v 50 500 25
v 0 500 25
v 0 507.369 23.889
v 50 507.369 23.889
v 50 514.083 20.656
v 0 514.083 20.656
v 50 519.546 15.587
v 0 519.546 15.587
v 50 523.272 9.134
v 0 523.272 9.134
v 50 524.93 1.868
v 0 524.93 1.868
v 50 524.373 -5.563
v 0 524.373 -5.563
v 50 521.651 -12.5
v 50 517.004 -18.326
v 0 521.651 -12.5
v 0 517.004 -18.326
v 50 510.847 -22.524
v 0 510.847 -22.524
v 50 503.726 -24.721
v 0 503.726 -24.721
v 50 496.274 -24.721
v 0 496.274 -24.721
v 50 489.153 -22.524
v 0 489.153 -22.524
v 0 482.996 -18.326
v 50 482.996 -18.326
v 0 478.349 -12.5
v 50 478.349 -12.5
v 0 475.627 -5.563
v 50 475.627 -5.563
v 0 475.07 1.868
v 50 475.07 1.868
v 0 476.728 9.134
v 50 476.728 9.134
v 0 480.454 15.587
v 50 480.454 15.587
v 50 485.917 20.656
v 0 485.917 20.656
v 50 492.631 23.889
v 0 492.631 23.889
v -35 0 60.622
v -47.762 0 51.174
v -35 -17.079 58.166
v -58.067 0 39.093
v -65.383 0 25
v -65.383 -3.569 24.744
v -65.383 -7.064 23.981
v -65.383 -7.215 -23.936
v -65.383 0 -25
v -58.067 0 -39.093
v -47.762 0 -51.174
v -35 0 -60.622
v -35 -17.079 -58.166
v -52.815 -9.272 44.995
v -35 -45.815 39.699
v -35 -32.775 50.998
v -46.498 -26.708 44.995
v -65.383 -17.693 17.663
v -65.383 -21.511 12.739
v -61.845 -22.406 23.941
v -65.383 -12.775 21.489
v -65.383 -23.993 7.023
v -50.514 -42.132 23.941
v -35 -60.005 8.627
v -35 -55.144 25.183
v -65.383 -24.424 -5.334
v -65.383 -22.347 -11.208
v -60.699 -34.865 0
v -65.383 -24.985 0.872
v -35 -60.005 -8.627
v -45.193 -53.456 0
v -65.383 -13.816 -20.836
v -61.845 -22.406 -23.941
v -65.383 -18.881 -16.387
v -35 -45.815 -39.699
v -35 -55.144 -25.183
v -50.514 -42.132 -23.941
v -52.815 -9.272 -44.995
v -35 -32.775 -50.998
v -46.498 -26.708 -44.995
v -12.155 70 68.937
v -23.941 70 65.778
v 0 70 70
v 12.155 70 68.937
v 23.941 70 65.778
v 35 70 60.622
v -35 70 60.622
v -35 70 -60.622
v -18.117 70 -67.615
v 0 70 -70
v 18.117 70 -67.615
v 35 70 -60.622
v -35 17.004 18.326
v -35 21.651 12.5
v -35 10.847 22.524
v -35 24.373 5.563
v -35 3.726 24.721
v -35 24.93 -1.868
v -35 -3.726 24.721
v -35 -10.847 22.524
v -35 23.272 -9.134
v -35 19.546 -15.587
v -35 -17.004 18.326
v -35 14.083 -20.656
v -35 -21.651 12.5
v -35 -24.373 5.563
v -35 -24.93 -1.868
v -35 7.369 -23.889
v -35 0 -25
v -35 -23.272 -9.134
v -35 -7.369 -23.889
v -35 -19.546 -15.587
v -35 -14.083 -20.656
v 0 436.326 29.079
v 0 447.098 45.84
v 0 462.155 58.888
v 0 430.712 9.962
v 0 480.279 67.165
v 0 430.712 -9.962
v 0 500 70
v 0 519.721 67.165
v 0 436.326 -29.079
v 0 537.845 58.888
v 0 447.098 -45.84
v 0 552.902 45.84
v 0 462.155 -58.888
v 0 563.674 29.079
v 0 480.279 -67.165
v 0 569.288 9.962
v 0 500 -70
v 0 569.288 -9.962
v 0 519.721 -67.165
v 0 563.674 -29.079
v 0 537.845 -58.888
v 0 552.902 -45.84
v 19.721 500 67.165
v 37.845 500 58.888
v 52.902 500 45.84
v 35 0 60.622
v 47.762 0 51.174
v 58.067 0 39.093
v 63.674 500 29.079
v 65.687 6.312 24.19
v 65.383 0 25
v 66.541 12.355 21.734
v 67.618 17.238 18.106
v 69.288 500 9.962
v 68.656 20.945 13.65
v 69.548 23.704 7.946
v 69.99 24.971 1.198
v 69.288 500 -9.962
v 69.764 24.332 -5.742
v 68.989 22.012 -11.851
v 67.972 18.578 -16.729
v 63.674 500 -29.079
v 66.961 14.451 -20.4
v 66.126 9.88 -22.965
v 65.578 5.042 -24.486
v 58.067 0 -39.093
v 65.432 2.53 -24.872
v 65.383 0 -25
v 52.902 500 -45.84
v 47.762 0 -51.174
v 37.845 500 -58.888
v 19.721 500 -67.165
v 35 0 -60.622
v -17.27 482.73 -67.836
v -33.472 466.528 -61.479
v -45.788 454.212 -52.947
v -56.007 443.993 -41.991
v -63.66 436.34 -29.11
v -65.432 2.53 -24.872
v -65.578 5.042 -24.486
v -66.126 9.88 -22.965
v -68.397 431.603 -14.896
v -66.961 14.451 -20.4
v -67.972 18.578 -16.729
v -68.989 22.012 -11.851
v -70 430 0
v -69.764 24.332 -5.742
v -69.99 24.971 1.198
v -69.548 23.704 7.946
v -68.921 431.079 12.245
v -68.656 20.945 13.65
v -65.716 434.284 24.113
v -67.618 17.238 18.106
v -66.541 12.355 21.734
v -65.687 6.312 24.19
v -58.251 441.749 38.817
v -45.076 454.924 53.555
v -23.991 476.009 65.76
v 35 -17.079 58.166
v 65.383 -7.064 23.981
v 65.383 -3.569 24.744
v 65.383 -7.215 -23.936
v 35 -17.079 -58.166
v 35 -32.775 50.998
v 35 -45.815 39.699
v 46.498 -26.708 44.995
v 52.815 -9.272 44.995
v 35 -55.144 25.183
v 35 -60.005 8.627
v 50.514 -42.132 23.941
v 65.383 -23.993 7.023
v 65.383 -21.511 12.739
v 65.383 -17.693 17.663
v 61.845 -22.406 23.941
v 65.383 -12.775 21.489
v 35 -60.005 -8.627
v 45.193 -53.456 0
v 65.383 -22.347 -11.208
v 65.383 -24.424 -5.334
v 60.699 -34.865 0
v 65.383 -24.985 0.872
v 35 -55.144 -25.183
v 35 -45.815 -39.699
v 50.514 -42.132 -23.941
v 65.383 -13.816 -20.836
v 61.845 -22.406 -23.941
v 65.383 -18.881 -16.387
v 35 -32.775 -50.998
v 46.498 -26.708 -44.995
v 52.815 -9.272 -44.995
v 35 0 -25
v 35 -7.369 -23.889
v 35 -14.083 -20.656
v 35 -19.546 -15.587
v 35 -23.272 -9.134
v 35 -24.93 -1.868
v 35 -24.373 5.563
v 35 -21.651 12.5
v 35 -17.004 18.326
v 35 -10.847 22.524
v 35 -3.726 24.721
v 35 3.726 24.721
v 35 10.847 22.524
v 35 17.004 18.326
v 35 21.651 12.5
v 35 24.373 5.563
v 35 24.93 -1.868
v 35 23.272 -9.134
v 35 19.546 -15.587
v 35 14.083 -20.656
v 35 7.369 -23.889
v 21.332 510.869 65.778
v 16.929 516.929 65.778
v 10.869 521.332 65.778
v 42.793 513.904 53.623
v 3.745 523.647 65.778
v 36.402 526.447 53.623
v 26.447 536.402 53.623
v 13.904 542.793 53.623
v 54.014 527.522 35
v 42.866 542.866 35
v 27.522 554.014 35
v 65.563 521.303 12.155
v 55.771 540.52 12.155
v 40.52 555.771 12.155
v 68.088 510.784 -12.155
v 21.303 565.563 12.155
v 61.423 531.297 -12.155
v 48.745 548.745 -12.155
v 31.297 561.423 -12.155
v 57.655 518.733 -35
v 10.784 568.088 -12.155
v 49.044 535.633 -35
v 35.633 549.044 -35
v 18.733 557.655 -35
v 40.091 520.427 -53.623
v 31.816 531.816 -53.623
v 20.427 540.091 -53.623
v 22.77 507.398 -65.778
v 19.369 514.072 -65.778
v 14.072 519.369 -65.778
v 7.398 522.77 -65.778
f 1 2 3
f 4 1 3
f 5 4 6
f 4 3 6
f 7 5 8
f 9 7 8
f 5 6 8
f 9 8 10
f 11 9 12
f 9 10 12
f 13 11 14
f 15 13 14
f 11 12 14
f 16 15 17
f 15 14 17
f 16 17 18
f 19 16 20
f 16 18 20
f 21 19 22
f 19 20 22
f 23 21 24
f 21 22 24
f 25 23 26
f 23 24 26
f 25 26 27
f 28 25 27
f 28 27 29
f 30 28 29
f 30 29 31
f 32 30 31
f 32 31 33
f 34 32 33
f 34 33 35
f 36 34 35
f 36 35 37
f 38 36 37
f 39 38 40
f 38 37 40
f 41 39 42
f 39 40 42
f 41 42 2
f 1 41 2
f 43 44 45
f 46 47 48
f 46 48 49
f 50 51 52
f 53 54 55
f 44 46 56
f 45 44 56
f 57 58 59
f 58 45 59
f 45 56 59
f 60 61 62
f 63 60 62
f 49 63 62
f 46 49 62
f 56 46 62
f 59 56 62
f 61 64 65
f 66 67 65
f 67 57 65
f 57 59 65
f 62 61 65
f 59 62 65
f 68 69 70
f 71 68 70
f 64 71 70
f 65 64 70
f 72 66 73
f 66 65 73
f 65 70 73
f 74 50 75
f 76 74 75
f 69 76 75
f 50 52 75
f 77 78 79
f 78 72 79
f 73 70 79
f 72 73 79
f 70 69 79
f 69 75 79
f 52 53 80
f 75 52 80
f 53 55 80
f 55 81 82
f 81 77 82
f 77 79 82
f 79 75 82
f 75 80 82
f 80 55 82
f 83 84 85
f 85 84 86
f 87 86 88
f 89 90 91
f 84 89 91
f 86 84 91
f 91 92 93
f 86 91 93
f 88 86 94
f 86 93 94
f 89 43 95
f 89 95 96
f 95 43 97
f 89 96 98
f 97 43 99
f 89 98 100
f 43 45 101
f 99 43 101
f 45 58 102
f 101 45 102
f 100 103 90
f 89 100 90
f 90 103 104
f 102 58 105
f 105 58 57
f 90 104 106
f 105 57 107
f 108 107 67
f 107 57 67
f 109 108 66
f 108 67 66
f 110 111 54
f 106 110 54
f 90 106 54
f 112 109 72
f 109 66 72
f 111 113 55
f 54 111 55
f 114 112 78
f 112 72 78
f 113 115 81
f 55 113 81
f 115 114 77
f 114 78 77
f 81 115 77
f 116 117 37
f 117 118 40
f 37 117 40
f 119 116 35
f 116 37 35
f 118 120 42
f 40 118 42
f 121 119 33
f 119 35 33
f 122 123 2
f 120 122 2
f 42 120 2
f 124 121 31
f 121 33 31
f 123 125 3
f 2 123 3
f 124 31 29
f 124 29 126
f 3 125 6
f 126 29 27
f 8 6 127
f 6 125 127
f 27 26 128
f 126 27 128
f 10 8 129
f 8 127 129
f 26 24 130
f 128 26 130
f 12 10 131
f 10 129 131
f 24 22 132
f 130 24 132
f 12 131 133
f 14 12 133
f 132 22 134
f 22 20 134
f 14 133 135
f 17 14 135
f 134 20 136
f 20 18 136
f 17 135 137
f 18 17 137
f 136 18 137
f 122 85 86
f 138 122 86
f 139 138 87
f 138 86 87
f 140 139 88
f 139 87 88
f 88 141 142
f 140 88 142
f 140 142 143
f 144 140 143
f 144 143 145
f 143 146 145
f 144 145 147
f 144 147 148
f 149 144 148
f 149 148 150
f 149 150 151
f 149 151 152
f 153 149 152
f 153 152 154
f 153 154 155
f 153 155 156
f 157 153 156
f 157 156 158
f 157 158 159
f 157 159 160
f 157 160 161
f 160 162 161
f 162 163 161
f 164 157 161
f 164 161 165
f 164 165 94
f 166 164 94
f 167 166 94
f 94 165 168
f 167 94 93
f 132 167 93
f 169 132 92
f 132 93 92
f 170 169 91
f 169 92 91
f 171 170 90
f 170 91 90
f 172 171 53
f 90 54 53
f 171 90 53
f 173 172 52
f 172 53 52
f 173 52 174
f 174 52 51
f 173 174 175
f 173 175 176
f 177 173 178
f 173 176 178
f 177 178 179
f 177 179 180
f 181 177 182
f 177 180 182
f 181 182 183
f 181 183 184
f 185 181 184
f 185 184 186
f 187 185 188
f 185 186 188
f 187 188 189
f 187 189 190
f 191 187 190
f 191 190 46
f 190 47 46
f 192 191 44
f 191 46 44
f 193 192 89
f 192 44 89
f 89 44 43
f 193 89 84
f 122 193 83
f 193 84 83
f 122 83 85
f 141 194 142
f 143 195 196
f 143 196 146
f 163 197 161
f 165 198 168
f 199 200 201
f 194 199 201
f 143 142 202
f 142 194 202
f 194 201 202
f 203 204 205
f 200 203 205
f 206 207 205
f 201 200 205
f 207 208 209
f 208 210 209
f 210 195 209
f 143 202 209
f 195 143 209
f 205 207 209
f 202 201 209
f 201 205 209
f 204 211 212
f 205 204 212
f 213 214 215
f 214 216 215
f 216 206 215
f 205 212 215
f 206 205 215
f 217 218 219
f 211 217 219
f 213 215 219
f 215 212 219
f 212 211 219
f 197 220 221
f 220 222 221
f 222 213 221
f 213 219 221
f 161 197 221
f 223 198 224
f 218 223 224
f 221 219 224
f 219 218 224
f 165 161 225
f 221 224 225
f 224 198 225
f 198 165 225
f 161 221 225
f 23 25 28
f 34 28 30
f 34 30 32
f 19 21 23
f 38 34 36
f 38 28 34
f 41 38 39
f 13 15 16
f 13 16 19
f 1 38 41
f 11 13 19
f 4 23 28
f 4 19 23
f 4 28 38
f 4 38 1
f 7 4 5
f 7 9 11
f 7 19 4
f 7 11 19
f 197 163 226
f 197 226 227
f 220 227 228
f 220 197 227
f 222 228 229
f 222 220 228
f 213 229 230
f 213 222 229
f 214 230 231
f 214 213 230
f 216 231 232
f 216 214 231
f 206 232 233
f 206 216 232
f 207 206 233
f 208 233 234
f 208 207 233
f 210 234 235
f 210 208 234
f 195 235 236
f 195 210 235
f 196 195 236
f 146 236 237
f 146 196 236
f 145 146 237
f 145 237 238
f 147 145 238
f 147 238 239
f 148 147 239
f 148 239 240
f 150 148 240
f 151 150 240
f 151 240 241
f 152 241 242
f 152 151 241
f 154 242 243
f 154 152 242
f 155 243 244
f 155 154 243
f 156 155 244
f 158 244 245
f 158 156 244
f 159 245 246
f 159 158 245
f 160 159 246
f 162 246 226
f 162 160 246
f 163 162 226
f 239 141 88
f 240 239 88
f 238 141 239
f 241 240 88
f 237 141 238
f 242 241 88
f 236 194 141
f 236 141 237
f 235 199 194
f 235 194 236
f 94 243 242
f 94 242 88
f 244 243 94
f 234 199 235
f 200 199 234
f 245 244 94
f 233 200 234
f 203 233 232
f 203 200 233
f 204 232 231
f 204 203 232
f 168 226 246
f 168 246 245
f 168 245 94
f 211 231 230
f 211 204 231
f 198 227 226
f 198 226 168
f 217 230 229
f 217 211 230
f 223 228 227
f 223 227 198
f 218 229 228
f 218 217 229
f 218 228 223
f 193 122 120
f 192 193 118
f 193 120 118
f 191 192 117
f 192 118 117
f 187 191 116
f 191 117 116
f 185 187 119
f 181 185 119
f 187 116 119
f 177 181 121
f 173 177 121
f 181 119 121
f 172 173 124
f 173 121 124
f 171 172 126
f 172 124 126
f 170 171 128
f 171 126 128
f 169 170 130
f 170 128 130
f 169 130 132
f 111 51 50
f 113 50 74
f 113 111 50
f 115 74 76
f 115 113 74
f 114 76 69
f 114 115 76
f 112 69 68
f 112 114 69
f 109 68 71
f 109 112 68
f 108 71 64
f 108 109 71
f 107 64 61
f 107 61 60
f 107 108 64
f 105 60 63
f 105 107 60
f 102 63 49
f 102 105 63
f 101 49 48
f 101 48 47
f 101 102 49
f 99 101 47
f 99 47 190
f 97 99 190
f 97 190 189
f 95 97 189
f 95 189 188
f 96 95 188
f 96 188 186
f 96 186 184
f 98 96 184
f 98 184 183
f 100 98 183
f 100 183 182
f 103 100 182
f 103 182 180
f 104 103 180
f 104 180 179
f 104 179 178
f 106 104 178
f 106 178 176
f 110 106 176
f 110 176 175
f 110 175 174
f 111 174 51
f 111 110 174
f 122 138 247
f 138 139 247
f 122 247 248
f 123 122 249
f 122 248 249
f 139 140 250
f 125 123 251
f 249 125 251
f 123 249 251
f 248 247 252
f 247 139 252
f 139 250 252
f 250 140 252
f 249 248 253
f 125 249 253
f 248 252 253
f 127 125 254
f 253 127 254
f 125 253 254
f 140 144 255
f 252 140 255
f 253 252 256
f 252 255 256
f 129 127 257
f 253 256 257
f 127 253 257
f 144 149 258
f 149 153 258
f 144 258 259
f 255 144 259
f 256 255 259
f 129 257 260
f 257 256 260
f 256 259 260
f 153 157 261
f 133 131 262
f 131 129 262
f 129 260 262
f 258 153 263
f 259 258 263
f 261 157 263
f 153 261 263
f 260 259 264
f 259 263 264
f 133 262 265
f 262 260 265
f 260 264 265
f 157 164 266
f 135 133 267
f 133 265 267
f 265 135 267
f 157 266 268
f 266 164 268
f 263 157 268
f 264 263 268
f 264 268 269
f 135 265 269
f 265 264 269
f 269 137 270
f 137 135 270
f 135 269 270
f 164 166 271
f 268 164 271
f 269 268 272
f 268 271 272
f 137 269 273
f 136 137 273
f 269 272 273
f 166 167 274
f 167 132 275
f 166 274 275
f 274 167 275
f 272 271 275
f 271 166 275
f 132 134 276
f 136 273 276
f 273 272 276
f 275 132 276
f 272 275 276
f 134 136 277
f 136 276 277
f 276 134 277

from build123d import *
from build123d.topology import SkipClean

# Parameters (mm, degrees)
SKETCH2_R               = 70.00000000000001
BOSS_EXTRUDE1_DEPTH     = 500
SKETCH5_R               = 70.00000000000003
CUT_EXTRUDE1_DEPTH      = 500
CUT_EXTRUDE2_DEPTH      = 70
CUT_EXTRUDE2_DEPTH_BACK = 100
SKETCH6_W               = 70
SKETCH6_H               = 140
CUT_EXTRUDE3_DEPTH      = 120
CUT_EXTRUDE3_DEPTH_BACK = 100
SKETCH7_R               = 25
SKETCH8_R               = 25.000000000000007
CUT_EXTRUDE4_DEPTH      = 50


with BuildPart() as part:
    # Sketch2 → Boss-Extrude1 (new body)
    with BuildSketch(Plane(origin=(0, 0, 0), x_dir=(1, 0, 0), z_dir=(0, 1, 0))):
        with Locations(Location((0, 0, 0), (0, 0, 270))):
            Circle(SKETCH2_R)
    extrude(amount=BOSS_EXTRUDE1_DEPTH)

    # Sketch3 one side → Revolve1 (revolve)
    with SkipClean():  # the faces are left unmerged after this step: merging them gives an invalid solid
        with BuildSketch(Plane(origin=(0, 0, 0), x_dir=(-1, 0, 0), z_dir=(0, -1, 0))):
            with BuildLine():
                ThreePointArc((-1.505e-12, -70.00000000000001), (49.497474683057796, -49.49747468305888), (70.00000000000001, -2.07e-14))
                ThreePointArc((70.00000000000001, -3.55e-15), (49.497474683058854, 49.49747468305782), (1.46534e-12, 70.00000000000001))
                Line((0, 70.00000000000001), (0, -70.00000000000001))
            make_face()
        revolve(axis=Axis((0, 0, 0), (0, 0, 1)))

    # Sketch4 → Revolve2 (revolve)
    with SkipClean():  # the faces are left unmerged after this step: merging them gives an invalid solid
        with BuildSketch(Plane(origin=(0, 500, 0), x_dir=(1, 0, 0), z_dir=(0, 1, 0))):
            with BuildLine():
                Line((0, 70.00000000000001), (0, -70.00000000000001))
                ThreePointArc((0, -70.00000000000001), (70.00000000000001, 0), (0, 70.00000000000001))
            make_face()
        revolve(axis=Axis((0, 500, -70.00000000000001), (0, 0, 1)))

    # Sketch5 → Cut-Extrude1 (cut)
    with SkipClean():  # the faces are left unmerged after this step: merging them gives an invalid solid
        with BuildSketch(Plane(origin=(0, 0, 0), x_dir=(0, 0, -1), z_dir=(1, 0, 0))):
            with Locations((0, 500)):
                Circle(SKETCH5_R)
        extrude(amount=-CUT_EXTRUDE1_DEPTH, mode=Mode.SUBTRACT)

    # Sketch6 → Cut-Extrude2 (cut, two sides: drawn at the far end of the back side and taken through both)
    with BuildSketch(Plane(origin=(0, 0, 0), x_dir=(1, 0, 0), z_dir=(0, 1, 0)).offset(-CUT_EXTRUDE2_DEPTH_BACK)):
        Rectangle(SKETCH6_W, SKETCH6_H)
    extrude(amount=CUT_EXTRUDE2_DEPTH + CUT_EXTRUDE2_DEPTH_BACK, mode=Mode.SUBTRACT)

    # Sketch7 → Cut-Extrude3 (cut, two sides: drawn at the far end of the back side and taken through both)
    with BuildSketch(Plane.ZY.offset(-35).offset(-CUT_EXTRUDE3_DEPTH_BACK)):
        with Locations(Location((0, 0, 0), (0, 0, 180))):
            Circle(SKETCH7_R)
    extrude(amount=CUT_EXTRUDE3_DEPTH + CUT_EXTRUDE3_DEPTH_BACK, mode=Mode.SUBTRACT)

    # Sketch8 → Cut-Extrude4 (cut)
    with BuildSketch(Plane.ZY):
        with Locations((0, 500)):
            Circle(SKETCH8_R)
    extrude(amount=-CUT_EXTRUDE4_DEPTH, mode=Mode.SUBTRACT)


solid = part.part
